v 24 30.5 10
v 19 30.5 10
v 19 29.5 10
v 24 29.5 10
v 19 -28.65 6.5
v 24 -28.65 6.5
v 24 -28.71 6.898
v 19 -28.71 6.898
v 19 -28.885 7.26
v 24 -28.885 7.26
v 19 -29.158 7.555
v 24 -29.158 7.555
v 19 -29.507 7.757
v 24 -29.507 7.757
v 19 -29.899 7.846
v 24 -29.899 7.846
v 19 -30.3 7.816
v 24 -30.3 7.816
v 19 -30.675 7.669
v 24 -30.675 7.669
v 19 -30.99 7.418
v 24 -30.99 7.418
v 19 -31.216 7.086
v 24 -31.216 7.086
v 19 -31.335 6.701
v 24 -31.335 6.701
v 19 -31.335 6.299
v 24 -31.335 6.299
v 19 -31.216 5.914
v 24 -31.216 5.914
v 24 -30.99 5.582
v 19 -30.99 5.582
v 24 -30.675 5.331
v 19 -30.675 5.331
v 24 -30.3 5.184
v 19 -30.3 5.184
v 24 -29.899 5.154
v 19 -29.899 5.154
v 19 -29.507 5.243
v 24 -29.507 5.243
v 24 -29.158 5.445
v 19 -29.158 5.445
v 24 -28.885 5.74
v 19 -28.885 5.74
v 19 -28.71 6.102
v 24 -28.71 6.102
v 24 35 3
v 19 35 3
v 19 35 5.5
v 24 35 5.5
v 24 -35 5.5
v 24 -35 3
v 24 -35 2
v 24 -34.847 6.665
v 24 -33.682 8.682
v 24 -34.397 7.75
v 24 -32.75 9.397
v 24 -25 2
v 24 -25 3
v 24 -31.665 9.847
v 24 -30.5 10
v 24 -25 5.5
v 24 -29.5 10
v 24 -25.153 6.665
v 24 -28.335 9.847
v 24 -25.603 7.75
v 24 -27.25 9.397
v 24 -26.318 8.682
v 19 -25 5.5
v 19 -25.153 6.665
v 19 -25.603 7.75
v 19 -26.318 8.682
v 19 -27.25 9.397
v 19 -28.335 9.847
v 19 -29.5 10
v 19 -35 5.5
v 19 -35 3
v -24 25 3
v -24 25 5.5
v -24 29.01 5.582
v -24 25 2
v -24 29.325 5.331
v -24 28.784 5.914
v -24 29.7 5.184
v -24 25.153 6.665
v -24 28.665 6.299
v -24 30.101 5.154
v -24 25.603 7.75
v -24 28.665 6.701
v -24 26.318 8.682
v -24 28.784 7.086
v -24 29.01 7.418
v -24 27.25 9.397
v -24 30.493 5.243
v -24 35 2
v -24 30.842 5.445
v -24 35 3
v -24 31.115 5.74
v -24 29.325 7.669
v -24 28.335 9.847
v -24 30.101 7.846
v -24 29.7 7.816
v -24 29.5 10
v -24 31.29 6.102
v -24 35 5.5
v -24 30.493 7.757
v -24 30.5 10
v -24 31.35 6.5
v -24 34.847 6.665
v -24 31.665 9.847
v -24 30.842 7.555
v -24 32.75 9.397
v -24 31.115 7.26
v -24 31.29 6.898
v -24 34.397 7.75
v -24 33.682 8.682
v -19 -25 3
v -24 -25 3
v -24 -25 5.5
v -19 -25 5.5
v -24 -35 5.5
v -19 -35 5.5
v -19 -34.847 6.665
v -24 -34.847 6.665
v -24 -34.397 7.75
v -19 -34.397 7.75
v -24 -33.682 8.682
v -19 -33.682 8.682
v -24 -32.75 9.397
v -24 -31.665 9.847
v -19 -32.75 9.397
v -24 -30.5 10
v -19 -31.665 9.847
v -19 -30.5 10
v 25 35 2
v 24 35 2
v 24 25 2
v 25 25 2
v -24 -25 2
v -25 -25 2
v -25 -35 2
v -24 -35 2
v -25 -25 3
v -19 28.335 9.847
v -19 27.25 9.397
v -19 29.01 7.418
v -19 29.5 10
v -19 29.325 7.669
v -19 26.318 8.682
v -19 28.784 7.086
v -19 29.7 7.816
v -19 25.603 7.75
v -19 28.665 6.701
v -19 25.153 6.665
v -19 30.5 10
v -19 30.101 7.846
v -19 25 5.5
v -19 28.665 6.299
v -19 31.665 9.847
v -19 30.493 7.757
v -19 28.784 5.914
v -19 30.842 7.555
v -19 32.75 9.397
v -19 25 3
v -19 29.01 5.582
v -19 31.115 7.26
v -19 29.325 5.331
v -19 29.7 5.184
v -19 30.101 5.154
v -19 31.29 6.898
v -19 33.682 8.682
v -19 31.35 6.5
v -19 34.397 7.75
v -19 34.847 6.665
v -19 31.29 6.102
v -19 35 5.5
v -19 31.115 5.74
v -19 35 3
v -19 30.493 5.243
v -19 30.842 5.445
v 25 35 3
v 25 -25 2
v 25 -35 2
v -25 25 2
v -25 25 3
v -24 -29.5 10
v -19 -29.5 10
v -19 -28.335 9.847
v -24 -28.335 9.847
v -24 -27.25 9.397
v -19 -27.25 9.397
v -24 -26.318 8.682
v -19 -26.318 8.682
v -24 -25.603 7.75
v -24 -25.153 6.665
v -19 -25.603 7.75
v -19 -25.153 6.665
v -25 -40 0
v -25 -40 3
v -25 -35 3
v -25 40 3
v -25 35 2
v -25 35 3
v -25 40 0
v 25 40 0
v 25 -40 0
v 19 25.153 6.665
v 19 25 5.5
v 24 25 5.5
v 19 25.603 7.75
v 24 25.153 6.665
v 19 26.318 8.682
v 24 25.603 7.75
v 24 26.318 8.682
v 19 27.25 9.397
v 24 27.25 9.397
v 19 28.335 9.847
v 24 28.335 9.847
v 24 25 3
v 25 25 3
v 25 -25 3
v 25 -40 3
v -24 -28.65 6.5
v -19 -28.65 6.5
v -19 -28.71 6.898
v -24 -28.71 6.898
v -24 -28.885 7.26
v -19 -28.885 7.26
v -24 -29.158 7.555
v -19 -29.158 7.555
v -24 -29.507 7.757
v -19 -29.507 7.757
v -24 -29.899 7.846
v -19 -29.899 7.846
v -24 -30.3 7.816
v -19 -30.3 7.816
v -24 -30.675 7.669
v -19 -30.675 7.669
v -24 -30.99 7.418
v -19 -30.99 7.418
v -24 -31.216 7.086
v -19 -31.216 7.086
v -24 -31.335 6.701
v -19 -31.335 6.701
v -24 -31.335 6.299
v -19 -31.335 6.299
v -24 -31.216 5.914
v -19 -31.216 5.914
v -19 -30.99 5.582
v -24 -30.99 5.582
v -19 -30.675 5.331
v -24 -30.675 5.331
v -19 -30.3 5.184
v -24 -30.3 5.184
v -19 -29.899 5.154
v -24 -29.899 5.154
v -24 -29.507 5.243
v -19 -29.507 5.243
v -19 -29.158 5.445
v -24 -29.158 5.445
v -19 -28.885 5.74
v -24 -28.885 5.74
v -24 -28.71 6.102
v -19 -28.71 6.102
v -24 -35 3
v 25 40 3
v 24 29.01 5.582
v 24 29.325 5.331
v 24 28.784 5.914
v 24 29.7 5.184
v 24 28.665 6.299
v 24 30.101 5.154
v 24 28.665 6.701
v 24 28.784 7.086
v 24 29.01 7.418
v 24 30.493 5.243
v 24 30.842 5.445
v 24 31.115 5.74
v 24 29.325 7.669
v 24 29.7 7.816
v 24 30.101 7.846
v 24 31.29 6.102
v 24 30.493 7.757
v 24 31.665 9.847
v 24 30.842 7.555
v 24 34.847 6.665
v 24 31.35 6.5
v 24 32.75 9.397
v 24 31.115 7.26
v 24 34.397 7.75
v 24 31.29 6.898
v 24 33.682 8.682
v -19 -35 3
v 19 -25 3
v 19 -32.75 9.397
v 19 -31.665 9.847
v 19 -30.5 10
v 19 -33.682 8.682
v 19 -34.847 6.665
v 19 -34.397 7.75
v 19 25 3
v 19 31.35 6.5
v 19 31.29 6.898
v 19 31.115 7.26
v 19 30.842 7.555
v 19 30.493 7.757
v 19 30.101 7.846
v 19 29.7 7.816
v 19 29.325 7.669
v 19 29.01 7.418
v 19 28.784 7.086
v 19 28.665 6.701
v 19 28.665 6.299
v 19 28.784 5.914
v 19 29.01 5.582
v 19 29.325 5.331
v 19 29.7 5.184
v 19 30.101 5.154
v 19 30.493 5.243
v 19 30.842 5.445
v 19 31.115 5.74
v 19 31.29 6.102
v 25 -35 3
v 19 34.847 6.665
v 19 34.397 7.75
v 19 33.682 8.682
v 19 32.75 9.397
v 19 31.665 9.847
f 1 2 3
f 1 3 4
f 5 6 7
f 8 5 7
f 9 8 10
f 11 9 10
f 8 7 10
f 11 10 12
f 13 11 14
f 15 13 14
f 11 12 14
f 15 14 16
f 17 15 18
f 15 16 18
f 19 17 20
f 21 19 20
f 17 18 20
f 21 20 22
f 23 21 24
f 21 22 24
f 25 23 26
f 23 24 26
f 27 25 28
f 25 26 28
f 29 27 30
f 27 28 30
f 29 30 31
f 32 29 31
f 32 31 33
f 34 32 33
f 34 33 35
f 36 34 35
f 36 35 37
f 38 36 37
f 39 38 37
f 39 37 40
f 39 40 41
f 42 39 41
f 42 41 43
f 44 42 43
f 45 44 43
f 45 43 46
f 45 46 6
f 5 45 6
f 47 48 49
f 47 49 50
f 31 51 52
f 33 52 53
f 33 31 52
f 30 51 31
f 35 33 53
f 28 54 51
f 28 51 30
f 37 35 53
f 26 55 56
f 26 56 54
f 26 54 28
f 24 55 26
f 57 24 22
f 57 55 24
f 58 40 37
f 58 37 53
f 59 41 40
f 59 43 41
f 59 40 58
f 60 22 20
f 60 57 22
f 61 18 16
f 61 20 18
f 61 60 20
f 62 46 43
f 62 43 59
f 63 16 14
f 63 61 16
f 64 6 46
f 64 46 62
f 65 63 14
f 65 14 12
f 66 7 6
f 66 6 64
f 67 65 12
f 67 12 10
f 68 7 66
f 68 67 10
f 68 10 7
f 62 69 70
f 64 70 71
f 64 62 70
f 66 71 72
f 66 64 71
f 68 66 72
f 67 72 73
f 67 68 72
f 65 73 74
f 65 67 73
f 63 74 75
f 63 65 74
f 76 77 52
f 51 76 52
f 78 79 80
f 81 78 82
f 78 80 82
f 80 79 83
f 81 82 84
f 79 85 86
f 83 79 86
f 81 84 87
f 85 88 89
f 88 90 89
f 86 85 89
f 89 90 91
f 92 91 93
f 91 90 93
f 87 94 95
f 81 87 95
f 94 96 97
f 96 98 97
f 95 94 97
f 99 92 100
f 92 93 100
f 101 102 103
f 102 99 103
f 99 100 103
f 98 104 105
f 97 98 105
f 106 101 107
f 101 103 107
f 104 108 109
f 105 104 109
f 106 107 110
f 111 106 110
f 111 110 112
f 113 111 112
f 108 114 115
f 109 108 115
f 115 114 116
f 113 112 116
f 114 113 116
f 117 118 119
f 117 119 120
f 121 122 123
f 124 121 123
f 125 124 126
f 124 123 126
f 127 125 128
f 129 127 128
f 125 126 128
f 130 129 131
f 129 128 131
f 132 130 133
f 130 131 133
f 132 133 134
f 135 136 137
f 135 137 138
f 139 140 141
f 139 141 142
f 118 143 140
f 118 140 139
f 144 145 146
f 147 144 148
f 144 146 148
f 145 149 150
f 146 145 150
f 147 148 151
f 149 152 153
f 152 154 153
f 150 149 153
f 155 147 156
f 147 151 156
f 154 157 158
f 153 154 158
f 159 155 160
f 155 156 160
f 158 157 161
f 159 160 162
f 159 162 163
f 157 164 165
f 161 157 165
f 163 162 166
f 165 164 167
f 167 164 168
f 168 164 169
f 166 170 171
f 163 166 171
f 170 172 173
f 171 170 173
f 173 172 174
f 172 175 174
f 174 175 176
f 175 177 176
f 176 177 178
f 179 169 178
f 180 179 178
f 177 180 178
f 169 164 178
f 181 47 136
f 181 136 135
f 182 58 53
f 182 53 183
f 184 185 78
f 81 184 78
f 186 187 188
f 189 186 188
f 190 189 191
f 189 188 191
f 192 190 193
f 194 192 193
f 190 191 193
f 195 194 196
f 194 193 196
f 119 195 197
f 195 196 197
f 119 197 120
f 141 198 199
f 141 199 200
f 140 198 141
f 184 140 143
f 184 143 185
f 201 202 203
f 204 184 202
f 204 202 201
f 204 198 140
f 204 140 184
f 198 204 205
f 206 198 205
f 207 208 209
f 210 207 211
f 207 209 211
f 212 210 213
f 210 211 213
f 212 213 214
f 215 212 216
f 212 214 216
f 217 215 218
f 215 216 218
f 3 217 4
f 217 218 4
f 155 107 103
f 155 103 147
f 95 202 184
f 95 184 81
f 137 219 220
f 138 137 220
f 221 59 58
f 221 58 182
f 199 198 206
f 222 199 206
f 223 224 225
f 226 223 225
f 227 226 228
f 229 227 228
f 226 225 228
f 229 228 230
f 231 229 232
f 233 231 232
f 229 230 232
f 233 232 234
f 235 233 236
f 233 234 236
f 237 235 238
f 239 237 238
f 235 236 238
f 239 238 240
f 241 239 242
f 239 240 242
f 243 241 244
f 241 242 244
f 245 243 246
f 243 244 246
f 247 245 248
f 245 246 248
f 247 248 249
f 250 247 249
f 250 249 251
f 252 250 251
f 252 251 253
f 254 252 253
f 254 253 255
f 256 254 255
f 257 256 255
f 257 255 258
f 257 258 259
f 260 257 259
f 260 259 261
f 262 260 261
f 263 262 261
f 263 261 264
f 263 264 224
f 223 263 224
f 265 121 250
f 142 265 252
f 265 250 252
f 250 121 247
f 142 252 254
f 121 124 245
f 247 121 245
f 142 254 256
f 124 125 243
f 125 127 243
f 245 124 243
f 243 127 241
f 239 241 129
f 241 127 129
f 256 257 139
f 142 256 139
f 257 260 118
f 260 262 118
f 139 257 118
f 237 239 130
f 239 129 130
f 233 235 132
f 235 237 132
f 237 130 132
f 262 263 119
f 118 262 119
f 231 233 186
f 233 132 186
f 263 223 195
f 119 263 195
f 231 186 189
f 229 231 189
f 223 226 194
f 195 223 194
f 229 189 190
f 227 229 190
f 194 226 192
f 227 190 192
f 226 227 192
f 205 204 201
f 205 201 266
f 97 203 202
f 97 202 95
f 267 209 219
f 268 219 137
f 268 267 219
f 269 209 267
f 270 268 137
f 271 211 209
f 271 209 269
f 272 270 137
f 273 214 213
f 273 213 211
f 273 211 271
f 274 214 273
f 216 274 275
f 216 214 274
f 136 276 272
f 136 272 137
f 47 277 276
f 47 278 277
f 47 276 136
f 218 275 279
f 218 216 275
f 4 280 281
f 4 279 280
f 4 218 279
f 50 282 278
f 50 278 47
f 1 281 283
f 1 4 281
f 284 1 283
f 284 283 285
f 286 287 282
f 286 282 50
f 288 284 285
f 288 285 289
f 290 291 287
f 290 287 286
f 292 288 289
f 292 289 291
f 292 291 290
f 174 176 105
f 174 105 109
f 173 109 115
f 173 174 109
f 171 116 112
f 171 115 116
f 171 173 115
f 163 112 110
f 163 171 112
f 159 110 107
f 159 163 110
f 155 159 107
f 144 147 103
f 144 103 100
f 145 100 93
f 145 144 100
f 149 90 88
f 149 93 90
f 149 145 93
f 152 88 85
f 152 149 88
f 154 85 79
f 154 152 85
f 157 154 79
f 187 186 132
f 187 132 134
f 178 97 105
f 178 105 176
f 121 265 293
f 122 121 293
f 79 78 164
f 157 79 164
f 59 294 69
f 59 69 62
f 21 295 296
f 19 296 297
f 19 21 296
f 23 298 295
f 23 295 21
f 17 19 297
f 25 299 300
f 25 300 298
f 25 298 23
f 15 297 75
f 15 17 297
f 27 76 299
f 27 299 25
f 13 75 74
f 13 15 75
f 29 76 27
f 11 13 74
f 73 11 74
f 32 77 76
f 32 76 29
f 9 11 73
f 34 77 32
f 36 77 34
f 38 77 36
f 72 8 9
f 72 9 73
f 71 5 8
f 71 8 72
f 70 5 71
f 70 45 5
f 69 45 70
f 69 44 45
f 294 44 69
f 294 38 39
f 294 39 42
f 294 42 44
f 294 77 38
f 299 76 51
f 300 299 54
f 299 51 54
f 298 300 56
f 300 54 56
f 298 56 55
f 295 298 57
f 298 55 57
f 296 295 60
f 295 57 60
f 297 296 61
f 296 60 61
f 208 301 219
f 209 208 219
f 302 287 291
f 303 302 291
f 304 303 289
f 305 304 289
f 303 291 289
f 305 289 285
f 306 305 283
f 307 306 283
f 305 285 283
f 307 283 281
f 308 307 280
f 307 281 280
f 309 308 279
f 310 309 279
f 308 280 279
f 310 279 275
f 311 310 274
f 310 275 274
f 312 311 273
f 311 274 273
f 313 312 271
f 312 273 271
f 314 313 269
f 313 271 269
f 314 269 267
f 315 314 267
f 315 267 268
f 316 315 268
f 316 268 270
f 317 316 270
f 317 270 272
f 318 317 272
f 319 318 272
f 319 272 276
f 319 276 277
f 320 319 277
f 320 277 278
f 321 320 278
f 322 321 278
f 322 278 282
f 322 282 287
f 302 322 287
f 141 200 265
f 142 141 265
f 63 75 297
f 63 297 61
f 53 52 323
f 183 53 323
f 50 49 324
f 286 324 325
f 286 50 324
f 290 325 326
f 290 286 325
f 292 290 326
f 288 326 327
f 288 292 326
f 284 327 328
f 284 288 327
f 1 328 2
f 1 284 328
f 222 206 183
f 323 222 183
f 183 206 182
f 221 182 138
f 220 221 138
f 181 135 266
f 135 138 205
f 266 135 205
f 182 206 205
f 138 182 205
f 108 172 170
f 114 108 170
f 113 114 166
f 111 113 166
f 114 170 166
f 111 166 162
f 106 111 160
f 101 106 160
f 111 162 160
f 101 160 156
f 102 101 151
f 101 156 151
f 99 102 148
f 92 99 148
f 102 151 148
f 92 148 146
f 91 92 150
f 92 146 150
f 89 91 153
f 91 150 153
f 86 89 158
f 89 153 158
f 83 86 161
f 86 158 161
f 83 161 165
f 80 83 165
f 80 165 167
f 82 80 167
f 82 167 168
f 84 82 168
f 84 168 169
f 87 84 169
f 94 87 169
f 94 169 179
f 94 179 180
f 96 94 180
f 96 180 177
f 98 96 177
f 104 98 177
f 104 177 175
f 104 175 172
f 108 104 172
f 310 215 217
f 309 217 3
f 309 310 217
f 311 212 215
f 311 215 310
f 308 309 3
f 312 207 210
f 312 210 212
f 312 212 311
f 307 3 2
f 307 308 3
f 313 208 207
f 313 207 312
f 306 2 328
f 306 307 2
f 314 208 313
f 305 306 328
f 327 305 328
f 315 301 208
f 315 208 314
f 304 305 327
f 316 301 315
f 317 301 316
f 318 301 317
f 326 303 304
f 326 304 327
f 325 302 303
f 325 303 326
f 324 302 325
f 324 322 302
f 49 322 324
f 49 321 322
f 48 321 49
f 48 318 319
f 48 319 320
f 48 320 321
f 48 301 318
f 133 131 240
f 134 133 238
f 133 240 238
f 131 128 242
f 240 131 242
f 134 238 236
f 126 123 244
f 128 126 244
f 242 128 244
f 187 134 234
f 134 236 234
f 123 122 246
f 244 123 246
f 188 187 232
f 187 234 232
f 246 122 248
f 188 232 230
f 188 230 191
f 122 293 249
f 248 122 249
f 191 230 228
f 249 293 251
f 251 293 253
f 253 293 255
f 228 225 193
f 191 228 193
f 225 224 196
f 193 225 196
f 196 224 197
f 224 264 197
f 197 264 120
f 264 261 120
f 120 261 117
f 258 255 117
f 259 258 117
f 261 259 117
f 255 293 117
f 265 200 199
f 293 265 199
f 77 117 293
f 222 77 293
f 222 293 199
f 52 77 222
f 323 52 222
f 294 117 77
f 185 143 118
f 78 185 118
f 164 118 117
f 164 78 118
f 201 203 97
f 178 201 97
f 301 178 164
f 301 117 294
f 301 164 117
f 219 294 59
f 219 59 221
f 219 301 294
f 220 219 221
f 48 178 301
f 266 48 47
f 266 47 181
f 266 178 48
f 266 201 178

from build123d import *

# Parameters (mm, degrees)
F0_W      = 50
F0_H      = 80
F1_DEPTH  = 3
F2_W      = 6
F2_H      = 10
F3_DEPTH  = 7
F4_R      = 1.35
F5_DEPTH  = 50.001
F6_R      = 4.5
F7_R      = 1.35
F8_DEPTH  = 1
F9_R      = 1.35
F10_DEPTH = 1
F11_W     = 1
F11_H     = 10
F12_DEPTH = 1


with BuildPart() as f1:
    # F0 (on Top) → F1 (new body)
    with BuildSketch(Plane.XY):
        Rectangle(F0_W, F0_H)
    extrude(amount=F1_DEPTH)

    # F2 (on face) → F3 (join)
    with BuildSketch(Plane.XY.offset(3)):
        with Locations((-22, 30)):
            Rectangle(F2_W, F2_H)
        with Locations((22, 30)):
            Rectangle(F2_W, F2_H)
        with Locations((-22, -30)):
            Rectangle(F2_W, F2_H)
        with Locations((22, -30)):
            Rectangle(F2_W, F2_H)
    extrude(amount=F3_DEPTH)

    # F4 (on face) → F5 (cut, through all)
    with BuildSketch(Plane.YZ.offset(25)):
        with Locations((-30, 6.5)):
            Circle(F4_R)
        with Locations((30, 6.5)):
            Circle(F4_R)
    extrude(amount=-F5_DEPTH, mode=Mode.SUBTRACT)

    # F6
    f6_edges = [f1.edges().sort_by_distance(p)[0] for p in [
        (22, -35, 10),
        (22, -25, 10),
        (-22, -35, 10),
        (-22, -25, 10),
        (-22, 25, 10),
        (-22, 35, 10),
        (22, 25, 10),
        (22, 35, 10),
    ]]
    fillet(f6_edges, radius=F6_R)

    # F7 (on face) → F8 (cut)
    with BuildSketch(Plane.YZ.offset(25)):
        with BuildLine():
            Line((-35, 5.5), (-35, 3))
            Line((-35, 3), (-25, 3))
            Line((-25, 3), (-25, 5.5))
            ThreePointArc((-25, 5.5), (-26.3180194847, 8.6819805153), (-29.5, 10))
            Line((-29.5, 10), (-30.5, 10))
            ThreePointArc((-30.5, 10), (-33.6819805153, 8.6819805153), (-35, 5.5))
        make_face()
        with Locations((-30, 6.5)):
            Circle(F7_R, mode=Mode.SUBTRACT)
        with BuildLine():
            Line((25, 5.5), (25, 3))
            Line((25, 3), (35, 3))
            Line((35, 3), (35, 5.5))
            ThreePointArc((35, 5.5), (33.6819805153, 8.6819805153), (30.5, 10))
            Line((30.5, 10), (29.5, 10))
            ThreePointArc((29.5, 10), (26.3180194847, 8.6819805153), (25, 5.5))
        make_face()
        with Locations((30, 6.5)):
            Circle(F7_R, mode=Mode.SUBTRACT)
    extrude(amount=-F8_DEPTH, mode=Mode.SUBTRACT)

    # F9 (on face) → F10 (cut)
    with BuildSketch(Plane(origin=(-25, 0, 0), x_dir=(0, -1, 0), z_dir=(-1, 0, 0))):
        with BuildLine():
            Line((-35, 5.5), (-35, 3))
            Line((-35, 3), (-25, 3))
            Line((-25, 3), (-25, 5.5))
            ThreePointArc((-25, 5.5), (-26.3180194847, 8.6819805153), (-29.5, 10))
            Line((-29.5, 10), (-30.5, 10))
            ThreePointArc((-30.5, 10), (-33.6819805153, 8.6819805153), (-35, 5.5))
        make_face()
        with Locations((-30, 6.5)):
            Circle(F9_R, mode=Mode.SUBTRACT)
        with BuildLine():
            Line((25, 5.5), (25, 3))
            Line((25, 3), (35, 3))
            Line((35, 3), (35, 5.5))
            ThreePointArc((35, 5.5), (33.6819805153, 8.6819805153), (30.5, 10))
            Line((30.5, 10), (29.5, 10))
            ThreePointArc((29.5, 10), (26.3180194847, 8.6819805153), (25, 5.5))
        make_face()
        with Locations((30, 6.5)):
            Circle(F9_R, mode=Mode.SUBTRACT)
    extrude(amount=-F10_DEPTH, mode=Mode.SUBTRACT)

    # F11 (on face) → F12 (cut)
    with BuildSketch(Plane.XY.offset(3)):
        with Locations((-24.5, 30)):
            Rectangle(F11_W, F11_H)
        with Locations((24.5, 30)):
            Rectangle(F11_W, F11_H)
        with Locations((24.5, -30)):
            Rectangle(F11_W, F11_H)
        with Locations((-24.5, -30)):
            Rectangle(F11_W, F11_H)
    extrude(amount=-F12_DEPTH, mode=Mode.SUBTRACT)


solid = f1.part
